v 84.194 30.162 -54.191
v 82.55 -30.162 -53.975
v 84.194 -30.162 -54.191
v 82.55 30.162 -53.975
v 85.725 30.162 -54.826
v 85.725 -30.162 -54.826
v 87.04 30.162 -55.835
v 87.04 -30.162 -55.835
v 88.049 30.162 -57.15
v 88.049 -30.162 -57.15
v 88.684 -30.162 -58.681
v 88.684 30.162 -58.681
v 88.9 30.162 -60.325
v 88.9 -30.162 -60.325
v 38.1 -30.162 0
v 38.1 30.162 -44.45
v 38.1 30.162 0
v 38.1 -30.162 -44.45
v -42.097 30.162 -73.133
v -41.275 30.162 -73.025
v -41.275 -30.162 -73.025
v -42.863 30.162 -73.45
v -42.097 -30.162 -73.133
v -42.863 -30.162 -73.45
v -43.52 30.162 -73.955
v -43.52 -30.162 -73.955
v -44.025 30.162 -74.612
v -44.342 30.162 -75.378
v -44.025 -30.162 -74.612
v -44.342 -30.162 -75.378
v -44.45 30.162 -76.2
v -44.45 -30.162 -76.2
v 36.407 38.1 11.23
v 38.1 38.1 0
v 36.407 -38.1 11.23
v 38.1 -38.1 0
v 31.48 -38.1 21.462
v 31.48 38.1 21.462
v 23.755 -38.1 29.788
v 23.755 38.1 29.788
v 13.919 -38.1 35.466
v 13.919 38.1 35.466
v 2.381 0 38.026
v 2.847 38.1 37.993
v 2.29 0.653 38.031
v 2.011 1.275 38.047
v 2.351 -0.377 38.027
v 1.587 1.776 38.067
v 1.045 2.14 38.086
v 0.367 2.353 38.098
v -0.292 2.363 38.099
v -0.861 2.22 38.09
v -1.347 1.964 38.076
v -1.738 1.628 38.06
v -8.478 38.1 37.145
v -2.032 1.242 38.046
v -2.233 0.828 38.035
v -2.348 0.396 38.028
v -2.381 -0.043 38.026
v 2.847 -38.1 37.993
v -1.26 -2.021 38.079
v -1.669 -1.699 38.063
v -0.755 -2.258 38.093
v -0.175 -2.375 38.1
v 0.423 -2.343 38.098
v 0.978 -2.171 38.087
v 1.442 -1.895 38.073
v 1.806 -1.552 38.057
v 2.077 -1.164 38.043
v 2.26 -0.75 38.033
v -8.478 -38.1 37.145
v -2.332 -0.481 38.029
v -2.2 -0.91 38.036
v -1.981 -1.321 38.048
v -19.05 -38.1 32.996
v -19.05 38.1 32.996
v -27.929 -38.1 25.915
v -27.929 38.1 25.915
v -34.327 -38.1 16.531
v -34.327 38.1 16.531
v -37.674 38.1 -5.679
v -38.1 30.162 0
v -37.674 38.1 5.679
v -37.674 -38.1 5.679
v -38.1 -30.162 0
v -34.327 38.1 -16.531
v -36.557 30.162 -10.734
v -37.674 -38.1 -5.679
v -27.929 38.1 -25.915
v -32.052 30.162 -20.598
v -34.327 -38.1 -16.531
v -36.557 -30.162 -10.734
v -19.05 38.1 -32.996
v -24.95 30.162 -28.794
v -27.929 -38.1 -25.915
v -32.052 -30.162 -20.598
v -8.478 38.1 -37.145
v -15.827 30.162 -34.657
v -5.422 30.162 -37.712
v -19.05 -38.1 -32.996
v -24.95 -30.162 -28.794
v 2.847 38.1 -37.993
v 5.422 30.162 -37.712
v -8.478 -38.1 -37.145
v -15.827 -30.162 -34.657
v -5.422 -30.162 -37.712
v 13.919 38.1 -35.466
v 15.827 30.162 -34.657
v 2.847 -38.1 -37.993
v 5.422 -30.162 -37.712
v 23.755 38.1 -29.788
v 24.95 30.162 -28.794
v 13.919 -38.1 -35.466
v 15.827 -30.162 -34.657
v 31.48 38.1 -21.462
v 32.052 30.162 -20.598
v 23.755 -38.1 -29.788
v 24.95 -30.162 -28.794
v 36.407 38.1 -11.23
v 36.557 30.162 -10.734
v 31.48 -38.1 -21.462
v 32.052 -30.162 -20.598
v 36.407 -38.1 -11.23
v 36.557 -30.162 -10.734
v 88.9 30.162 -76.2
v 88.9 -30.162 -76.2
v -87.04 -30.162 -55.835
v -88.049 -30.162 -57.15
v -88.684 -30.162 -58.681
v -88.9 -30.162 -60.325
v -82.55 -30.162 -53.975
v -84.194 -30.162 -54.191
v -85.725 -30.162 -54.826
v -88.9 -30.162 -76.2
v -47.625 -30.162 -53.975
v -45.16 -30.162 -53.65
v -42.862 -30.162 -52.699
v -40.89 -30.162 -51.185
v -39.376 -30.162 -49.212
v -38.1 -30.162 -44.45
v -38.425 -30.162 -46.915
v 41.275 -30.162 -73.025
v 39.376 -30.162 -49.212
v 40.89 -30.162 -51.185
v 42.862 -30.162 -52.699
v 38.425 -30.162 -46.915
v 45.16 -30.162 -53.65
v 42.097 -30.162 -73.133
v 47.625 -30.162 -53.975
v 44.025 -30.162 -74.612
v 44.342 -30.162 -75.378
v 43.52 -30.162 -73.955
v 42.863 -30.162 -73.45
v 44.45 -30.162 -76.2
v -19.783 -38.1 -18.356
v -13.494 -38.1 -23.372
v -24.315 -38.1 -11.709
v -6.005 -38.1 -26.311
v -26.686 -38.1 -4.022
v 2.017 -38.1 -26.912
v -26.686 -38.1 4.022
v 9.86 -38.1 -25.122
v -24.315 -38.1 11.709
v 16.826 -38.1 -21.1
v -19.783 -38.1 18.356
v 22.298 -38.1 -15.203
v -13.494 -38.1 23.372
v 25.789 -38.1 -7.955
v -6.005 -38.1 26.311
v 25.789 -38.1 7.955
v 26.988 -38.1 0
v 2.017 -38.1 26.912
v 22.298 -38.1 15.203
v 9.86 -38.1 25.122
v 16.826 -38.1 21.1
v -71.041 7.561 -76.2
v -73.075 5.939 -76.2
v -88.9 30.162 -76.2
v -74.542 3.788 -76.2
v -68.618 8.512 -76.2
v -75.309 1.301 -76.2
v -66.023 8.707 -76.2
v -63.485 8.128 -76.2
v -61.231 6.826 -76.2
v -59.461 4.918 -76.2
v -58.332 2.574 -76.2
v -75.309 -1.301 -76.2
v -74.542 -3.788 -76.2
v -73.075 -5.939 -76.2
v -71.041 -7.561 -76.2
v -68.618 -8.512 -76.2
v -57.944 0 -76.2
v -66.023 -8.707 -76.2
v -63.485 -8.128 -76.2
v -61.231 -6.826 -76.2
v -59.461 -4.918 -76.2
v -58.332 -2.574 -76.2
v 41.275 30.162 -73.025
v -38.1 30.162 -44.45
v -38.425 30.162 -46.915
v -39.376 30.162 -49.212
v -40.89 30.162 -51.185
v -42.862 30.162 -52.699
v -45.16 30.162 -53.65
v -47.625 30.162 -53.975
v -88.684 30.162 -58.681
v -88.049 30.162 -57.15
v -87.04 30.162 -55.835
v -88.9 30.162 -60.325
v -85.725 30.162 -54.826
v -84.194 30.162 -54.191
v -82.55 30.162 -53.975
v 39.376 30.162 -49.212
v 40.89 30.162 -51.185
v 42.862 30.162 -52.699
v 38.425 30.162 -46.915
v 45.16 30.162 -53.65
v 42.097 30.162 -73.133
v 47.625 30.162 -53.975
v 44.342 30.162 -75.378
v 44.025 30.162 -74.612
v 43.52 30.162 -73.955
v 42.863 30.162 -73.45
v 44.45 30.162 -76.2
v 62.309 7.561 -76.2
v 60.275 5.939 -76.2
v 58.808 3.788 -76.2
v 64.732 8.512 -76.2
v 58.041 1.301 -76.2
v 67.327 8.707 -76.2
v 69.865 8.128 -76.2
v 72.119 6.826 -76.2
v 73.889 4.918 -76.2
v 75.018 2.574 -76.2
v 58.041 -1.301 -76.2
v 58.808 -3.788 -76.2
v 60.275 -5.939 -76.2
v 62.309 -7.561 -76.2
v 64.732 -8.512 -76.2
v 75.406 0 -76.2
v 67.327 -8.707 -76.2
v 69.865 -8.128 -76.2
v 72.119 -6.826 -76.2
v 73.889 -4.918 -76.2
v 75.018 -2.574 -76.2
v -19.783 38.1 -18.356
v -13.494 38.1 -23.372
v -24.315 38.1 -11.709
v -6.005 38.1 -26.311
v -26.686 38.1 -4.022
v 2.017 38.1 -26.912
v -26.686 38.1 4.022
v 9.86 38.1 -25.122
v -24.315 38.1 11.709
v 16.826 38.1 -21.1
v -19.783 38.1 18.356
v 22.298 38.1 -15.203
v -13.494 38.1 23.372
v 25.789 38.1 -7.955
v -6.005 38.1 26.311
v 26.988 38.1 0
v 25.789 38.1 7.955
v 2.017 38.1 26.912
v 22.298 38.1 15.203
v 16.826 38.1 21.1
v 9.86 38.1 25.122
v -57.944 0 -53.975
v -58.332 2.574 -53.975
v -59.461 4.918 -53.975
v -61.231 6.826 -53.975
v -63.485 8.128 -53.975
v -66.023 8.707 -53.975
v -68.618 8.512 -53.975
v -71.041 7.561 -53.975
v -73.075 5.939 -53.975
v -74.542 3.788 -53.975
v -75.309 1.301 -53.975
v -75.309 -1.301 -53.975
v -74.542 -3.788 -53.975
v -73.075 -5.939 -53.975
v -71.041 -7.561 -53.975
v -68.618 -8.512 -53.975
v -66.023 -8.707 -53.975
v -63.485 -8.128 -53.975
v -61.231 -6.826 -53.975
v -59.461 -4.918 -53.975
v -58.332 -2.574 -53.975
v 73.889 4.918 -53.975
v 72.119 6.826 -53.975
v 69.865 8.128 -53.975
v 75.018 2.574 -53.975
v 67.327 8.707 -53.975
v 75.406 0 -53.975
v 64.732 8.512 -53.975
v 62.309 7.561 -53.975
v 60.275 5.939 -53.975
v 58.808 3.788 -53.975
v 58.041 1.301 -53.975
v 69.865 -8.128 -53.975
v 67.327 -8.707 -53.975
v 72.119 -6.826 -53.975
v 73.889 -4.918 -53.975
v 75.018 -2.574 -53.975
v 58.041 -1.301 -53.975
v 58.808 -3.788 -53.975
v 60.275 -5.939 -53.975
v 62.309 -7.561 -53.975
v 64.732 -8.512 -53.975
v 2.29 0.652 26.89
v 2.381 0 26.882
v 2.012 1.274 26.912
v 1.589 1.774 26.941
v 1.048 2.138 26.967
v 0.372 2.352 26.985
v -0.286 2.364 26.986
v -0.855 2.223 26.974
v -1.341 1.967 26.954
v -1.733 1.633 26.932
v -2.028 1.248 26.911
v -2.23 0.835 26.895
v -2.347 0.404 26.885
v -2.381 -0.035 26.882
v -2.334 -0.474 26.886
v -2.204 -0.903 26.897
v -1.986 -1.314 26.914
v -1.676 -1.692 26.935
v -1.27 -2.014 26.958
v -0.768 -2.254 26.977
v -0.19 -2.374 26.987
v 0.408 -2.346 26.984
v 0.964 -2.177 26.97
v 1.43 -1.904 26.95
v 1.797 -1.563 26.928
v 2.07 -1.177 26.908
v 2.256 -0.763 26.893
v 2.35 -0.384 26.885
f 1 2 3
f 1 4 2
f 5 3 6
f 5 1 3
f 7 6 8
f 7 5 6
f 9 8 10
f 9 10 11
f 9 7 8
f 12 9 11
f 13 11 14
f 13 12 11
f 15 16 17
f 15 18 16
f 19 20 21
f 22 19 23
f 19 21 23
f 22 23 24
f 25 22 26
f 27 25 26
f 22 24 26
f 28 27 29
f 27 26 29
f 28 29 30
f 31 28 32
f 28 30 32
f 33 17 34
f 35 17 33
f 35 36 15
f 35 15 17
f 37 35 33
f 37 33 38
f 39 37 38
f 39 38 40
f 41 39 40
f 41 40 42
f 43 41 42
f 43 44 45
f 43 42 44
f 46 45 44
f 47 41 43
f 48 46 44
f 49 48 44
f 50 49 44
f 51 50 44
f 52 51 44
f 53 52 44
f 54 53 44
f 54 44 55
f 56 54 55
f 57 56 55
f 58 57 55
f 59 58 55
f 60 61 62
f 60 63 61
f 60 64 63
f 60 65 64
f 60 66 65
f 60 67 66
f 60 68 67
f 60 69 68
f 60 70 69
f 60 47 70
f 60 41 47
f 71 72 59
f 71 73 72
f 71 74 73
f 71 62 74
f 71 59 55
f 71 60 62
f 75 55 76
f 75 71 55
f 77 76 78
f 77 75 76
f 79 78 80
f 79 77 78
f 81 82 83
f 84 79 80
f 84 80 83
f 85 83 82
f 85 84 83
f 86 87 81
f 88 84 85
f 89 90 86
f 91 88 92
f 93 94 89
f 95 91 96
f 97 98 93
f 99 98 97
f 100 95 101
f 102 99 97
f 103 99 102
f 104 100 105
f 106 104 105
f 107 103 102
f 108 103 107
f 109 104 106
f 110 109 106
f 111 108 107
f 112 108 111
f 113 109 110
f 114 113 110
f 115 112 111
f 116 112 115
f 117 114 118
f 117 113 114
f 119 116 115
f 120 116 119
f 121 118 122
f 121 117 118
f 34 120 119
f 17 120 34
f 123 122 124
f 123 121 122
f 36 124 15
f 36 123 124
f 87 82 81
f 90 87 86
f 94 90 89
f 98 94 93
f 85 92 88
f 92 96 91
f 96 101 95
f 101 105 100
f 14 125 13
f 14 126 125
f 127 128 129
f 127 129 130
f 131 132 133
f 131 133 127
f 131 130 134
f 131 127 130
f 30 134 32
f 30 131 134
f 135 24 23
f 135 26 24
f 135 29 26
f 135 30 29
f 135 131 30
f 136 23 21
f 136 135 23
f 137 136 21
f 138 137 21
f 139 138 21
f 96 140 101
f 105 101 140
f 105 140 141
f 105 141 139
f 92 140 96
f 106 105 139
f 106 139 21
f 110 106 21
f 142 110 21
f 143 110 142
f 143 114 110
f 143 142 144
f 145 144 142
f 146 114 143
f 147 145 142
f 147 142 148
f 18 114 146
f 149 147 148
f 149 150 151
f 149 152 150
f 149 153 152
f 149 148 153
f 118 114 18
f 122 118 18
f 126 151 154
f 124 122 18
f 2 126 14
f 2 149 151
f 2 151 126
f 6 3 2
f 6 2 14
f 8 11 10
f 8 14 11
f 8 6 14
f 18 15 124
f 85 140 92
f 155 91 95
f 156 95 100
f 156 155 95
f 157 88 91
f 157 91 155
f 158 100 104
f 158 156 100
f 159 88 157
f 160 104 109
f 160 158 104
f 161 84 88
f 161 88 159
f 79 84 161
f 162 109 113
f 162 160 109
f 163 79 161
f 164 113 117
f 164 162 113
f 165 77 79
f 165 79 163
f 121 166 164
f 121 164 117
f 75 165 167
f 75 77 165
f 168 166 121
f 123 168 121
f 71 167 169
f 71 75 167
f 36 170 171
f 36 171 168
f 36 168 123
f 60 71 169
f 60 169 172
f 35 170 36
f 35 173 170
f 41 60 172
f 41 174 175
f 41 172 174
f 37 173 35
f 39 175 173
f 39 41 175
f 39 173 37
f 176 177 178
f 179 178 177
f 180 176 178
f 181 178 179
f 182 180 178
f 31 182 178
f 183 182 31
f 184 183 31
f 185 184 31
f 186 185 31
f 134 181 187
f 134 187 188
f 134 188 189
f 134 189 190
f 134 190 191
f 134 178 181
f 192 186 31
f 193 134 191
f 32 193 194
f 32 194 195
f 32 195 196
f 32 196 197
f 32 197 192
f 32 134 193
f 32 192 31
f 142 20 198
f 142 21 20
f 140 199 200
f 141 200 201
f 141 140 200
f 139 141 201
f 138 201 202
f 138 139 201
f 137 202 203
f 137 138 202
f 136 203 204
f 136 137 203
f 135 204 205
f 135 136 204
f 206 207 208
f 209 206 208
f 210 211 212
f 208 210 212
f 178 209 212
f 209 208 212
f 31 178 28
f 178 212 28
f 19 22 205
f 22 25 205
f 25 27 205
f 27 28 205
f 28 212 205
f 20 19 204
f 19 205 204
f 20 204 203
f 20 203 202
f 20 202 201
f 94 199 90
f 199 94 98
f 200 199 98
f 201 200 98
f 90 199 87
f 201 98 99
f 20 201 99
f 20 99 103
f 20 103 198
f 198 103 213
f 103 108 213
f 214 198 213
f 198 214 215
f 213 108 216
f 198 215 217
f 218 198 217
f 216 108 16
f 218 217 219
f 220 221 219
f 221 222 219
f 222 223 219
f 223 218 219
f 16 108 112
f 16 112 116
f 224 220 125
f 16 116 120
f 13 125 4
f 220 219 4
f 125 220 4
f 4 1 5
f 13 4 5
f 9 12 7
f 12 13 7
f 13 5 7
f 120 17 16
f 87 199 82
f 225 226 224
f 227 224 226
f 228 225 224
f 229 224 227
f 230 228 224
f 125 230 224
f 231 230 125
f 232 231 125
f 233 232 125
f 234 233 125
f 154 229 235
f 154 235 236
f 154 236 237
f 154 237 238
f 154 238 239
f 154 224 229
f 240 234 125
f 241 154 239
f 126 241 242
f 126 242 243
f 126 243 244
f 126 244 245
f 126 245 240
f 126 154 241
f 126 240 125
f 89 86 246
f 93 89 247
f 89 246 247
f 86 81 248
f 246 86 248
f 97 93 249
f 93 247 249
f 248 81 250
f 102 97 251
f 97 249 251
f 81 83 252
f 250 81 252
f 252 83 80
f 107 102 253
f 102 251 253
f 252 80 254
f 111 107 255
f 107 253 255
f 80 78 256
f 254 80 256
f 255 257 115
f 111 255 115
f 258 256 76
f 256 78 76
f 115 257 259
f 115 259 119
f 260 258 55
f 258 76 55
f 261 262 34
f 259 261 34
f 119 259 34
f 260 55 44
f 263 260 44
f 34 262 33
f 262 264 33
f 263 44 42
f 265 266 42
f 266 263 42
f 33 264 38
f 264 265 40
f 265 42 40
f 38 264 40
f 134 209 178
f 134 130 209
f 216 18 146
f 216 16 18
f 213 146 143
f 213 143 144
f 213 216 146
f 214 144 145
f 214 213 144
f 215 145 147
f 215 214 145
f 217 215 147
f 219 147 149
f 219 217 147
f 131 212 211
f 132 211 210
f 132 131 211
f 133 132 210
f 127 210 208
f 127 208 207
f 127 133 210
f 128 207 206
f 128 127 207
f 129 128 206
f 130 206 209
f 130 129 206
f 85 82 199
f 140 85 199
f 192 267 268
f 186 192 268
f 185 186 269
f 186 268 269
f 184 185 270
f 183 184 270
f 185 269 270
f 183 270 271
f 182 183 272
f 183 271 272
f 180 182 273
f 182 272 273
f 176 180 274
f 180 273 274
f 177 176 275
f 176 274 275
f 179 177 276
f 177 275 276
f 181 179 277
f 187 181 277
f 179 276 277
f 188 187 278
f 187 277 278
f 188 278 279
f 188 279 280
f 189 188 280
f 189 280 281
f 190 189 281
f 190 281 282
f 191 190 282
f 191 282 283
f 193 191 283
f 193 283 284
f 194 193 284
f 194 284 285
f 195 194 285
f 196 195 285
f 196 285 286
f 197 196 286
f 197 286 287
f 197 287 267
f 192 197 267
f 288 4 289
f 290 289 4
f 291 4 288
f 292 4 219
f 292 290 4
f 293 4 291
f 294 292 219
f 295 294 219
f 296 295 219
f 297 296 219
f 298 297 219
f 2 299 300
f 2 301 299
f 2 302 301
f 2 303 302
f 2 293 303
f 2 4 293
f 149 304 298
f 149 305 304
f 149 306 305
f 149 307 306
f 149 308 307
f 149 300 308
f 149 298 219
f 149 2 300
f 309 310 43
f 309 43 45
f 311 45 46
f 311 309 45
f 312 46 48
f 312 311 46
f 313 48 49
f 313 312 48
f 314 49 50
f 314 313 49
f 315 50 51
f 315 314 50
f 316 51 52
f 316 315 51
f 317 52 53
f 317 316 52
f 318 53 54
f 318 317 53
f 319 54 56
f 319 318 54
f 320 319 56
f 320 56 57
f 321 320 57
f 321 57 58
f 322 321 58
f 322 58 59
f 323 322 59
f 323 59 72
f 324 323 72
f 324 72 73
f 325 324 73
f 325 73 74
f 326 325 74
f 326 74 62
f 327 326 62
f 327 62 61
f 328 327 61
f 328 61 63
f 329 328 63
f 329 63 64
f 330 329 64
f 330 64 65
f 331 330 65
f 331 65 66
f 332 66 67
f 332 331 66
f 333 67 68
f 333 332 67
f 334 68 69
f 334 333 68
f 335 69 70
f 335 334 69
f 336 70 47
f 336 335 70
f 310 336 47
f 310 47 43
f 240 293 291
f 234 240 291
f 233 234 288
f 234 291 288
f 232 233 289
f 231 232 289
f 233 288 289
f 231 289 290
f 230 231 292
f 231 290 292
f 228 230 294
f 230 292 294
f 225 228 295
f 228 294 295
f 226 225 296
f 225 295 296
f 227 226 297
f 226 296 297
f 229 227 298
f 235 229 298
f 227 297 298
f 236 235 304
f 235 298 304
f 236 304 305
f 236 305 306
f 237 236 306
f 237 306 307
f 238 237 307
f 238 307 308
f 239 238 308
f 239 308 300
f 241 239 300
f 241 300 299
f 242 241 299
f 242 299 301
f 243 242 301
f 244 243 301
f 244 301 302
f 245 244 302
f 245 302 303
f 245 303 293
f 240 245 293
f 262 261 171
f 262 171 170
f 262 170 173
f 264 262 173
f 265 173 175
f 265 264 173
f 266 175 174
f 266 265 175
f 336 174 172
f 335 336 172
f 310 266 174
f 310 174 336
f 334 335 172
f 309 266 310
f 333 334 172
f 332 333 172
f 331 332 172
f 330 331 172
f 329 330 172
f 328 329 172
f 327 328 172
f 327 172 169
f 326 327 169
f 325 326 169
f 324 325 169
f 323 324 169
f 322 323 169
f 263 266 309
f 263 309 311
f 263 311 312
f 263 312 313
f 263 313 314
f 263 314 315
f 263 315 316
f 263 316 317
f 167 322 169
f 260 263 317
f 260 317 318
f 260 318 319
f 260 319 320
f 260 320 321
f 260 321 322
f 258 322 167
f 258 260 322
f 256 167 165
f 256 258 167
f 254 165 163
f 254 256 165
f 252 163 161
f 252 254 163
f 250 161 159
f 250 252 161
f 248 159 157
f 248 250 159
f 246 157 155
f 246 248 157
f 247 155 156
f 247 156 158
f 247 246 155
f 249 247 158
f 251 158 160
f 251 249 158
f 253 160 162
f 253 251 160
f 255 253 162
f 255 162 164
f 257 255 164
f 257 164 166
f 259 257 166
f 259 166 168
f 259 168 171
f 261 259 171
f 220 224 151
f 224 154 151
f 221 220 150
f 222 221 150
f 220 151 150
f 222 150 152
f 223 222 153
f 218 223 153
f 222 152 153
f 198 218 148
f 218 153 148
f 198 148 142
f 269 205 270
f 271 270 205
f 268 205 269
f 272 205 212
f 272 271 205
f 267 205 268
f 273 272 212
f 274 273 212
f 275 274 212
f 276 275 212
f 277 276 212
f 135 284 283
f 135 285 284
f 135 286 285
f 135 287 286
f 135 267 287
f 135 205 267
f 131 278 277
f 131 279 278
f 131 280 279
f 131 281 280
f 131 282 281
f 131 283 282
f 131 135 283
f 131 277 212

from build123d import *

# Parameters (mm, degrees)
F0_R     = 26.9875
F1_DEPTH = 38.1
F2_DEPTH = 30.1625
F3_R     = 8.73125
F4_DEPTH = 76.201
F5_R     = 2.38125
F6_DEPTH = 38.101
F7_R     = 9.525
F8_R     = 6.35
F9_R     = 3.17499


# Not quite as in the source:
# - a fillet or chamfer is up to 0.001 mm smaller than in the source, because OpenCascade refuses the exact size


with BuildPart() as f1:
    # F0 (on Front) → F1 (new body, symmetric)
    with BuildSketch(Plane.XZ):
        with BuildLine():
            ThreePointArc((-38.1, 0), (0, -38.1), (38.1, 0))
            ThreePointArc((38.1, 0), (0, 38.1), (-38.1, 0))
        make_face()
        Circle(F0_R, mode=Mode.SUBTRACT)
    extrude(amount=F1_DEPTH, both=True)

    # F0 (on Front) → F2 (join, symmetric)
    with BuildSketch(Plane.XZ):
        with BuildLine():
            ThreePointArc((-38.1, 0), (0, -38.1), (38.1, 0))
            ThreePointArc((38.1, 0), (0, 38.1), (-38.1, 0))
        make_face()
        Circle(F0_R, mode=Mode.SUBTRACT)
        with BuildLine():
            Line((38.1, -53.975), (38.1, 0))
            ThreePointArc((38.1, 0), (0, -38.1), (-38.1, 0))
            Line((-38.1, 0), (-38.1, -53.975))
            Line((-38.1, -53.975), (-88.9, -53.975))
            Line((-88.9, -53.975), (-88.9, -76.2))
            Line((-88.9, -76.2), (-44.45, -76.2))
            Line((-44.45, -76.2), (-44.45, -73.025))
            Line((-44.45, -73.025), (0, -73.025))
            Line((0, -73.025), (44.45, -73.025))
            Line((44.45, -73.025), (44.45, -76.2))
            Line((44.45, -76.2), (88.9, -76.2))
            Line((88.9, -76.2), (88.9, -53.975))
            Line((88.9, -53.975), (38.1, -53.975))
        make_face()
    extrude(amount=F2_DEPTH, both=True)

    # F3 (on Top) → F4 (cut, through all)
    with BuildSketch(Plane.XY):
        with Locations((-66.675, 0)):
            Circle(F3_R)
        with Locations((66.675, 0)):
            Circle(F3_R)
    extrude(amount=-F4_DEPTH, mode=Mode.SUBTRACT)

    # F5 (on Top) → F6 (cut, through all)
    with BuildSketch(Plane.XY):
        Circle(F5_R)
    extrude(amount=F6_DEPTH, mode=Mode.SUBTRACT)

    # F7
    f7_edges = [f1.edges().sort_by_distance(p)[0] for p in [
        (38.1, 0, -53.975),
        (-38.1, 0, -53.975),
    ]]
    fillet(f7_edges, radius=F7_R)

    # F8
    f8_edges = [f1.edges().sort_by_distance(p)[0] for p in [
        (-88.9, 0, -53.975),
        (88.9, 0, -53.975),
    ]]
    fillet(f8_edges, radius=F8_R)

    # F9 (radius 3.175 in the source; OpenCascade refuses exactly that, so slightly less here)
    f9_edges = [f1.edges().sort_by_distance(p)[0] for p in [
        (-44.45, 0, -73.025),
        (44.45, 0, -73.025),
    ]]
    fillet(f9_edges, radius=F9_R)


solid = f1.part
